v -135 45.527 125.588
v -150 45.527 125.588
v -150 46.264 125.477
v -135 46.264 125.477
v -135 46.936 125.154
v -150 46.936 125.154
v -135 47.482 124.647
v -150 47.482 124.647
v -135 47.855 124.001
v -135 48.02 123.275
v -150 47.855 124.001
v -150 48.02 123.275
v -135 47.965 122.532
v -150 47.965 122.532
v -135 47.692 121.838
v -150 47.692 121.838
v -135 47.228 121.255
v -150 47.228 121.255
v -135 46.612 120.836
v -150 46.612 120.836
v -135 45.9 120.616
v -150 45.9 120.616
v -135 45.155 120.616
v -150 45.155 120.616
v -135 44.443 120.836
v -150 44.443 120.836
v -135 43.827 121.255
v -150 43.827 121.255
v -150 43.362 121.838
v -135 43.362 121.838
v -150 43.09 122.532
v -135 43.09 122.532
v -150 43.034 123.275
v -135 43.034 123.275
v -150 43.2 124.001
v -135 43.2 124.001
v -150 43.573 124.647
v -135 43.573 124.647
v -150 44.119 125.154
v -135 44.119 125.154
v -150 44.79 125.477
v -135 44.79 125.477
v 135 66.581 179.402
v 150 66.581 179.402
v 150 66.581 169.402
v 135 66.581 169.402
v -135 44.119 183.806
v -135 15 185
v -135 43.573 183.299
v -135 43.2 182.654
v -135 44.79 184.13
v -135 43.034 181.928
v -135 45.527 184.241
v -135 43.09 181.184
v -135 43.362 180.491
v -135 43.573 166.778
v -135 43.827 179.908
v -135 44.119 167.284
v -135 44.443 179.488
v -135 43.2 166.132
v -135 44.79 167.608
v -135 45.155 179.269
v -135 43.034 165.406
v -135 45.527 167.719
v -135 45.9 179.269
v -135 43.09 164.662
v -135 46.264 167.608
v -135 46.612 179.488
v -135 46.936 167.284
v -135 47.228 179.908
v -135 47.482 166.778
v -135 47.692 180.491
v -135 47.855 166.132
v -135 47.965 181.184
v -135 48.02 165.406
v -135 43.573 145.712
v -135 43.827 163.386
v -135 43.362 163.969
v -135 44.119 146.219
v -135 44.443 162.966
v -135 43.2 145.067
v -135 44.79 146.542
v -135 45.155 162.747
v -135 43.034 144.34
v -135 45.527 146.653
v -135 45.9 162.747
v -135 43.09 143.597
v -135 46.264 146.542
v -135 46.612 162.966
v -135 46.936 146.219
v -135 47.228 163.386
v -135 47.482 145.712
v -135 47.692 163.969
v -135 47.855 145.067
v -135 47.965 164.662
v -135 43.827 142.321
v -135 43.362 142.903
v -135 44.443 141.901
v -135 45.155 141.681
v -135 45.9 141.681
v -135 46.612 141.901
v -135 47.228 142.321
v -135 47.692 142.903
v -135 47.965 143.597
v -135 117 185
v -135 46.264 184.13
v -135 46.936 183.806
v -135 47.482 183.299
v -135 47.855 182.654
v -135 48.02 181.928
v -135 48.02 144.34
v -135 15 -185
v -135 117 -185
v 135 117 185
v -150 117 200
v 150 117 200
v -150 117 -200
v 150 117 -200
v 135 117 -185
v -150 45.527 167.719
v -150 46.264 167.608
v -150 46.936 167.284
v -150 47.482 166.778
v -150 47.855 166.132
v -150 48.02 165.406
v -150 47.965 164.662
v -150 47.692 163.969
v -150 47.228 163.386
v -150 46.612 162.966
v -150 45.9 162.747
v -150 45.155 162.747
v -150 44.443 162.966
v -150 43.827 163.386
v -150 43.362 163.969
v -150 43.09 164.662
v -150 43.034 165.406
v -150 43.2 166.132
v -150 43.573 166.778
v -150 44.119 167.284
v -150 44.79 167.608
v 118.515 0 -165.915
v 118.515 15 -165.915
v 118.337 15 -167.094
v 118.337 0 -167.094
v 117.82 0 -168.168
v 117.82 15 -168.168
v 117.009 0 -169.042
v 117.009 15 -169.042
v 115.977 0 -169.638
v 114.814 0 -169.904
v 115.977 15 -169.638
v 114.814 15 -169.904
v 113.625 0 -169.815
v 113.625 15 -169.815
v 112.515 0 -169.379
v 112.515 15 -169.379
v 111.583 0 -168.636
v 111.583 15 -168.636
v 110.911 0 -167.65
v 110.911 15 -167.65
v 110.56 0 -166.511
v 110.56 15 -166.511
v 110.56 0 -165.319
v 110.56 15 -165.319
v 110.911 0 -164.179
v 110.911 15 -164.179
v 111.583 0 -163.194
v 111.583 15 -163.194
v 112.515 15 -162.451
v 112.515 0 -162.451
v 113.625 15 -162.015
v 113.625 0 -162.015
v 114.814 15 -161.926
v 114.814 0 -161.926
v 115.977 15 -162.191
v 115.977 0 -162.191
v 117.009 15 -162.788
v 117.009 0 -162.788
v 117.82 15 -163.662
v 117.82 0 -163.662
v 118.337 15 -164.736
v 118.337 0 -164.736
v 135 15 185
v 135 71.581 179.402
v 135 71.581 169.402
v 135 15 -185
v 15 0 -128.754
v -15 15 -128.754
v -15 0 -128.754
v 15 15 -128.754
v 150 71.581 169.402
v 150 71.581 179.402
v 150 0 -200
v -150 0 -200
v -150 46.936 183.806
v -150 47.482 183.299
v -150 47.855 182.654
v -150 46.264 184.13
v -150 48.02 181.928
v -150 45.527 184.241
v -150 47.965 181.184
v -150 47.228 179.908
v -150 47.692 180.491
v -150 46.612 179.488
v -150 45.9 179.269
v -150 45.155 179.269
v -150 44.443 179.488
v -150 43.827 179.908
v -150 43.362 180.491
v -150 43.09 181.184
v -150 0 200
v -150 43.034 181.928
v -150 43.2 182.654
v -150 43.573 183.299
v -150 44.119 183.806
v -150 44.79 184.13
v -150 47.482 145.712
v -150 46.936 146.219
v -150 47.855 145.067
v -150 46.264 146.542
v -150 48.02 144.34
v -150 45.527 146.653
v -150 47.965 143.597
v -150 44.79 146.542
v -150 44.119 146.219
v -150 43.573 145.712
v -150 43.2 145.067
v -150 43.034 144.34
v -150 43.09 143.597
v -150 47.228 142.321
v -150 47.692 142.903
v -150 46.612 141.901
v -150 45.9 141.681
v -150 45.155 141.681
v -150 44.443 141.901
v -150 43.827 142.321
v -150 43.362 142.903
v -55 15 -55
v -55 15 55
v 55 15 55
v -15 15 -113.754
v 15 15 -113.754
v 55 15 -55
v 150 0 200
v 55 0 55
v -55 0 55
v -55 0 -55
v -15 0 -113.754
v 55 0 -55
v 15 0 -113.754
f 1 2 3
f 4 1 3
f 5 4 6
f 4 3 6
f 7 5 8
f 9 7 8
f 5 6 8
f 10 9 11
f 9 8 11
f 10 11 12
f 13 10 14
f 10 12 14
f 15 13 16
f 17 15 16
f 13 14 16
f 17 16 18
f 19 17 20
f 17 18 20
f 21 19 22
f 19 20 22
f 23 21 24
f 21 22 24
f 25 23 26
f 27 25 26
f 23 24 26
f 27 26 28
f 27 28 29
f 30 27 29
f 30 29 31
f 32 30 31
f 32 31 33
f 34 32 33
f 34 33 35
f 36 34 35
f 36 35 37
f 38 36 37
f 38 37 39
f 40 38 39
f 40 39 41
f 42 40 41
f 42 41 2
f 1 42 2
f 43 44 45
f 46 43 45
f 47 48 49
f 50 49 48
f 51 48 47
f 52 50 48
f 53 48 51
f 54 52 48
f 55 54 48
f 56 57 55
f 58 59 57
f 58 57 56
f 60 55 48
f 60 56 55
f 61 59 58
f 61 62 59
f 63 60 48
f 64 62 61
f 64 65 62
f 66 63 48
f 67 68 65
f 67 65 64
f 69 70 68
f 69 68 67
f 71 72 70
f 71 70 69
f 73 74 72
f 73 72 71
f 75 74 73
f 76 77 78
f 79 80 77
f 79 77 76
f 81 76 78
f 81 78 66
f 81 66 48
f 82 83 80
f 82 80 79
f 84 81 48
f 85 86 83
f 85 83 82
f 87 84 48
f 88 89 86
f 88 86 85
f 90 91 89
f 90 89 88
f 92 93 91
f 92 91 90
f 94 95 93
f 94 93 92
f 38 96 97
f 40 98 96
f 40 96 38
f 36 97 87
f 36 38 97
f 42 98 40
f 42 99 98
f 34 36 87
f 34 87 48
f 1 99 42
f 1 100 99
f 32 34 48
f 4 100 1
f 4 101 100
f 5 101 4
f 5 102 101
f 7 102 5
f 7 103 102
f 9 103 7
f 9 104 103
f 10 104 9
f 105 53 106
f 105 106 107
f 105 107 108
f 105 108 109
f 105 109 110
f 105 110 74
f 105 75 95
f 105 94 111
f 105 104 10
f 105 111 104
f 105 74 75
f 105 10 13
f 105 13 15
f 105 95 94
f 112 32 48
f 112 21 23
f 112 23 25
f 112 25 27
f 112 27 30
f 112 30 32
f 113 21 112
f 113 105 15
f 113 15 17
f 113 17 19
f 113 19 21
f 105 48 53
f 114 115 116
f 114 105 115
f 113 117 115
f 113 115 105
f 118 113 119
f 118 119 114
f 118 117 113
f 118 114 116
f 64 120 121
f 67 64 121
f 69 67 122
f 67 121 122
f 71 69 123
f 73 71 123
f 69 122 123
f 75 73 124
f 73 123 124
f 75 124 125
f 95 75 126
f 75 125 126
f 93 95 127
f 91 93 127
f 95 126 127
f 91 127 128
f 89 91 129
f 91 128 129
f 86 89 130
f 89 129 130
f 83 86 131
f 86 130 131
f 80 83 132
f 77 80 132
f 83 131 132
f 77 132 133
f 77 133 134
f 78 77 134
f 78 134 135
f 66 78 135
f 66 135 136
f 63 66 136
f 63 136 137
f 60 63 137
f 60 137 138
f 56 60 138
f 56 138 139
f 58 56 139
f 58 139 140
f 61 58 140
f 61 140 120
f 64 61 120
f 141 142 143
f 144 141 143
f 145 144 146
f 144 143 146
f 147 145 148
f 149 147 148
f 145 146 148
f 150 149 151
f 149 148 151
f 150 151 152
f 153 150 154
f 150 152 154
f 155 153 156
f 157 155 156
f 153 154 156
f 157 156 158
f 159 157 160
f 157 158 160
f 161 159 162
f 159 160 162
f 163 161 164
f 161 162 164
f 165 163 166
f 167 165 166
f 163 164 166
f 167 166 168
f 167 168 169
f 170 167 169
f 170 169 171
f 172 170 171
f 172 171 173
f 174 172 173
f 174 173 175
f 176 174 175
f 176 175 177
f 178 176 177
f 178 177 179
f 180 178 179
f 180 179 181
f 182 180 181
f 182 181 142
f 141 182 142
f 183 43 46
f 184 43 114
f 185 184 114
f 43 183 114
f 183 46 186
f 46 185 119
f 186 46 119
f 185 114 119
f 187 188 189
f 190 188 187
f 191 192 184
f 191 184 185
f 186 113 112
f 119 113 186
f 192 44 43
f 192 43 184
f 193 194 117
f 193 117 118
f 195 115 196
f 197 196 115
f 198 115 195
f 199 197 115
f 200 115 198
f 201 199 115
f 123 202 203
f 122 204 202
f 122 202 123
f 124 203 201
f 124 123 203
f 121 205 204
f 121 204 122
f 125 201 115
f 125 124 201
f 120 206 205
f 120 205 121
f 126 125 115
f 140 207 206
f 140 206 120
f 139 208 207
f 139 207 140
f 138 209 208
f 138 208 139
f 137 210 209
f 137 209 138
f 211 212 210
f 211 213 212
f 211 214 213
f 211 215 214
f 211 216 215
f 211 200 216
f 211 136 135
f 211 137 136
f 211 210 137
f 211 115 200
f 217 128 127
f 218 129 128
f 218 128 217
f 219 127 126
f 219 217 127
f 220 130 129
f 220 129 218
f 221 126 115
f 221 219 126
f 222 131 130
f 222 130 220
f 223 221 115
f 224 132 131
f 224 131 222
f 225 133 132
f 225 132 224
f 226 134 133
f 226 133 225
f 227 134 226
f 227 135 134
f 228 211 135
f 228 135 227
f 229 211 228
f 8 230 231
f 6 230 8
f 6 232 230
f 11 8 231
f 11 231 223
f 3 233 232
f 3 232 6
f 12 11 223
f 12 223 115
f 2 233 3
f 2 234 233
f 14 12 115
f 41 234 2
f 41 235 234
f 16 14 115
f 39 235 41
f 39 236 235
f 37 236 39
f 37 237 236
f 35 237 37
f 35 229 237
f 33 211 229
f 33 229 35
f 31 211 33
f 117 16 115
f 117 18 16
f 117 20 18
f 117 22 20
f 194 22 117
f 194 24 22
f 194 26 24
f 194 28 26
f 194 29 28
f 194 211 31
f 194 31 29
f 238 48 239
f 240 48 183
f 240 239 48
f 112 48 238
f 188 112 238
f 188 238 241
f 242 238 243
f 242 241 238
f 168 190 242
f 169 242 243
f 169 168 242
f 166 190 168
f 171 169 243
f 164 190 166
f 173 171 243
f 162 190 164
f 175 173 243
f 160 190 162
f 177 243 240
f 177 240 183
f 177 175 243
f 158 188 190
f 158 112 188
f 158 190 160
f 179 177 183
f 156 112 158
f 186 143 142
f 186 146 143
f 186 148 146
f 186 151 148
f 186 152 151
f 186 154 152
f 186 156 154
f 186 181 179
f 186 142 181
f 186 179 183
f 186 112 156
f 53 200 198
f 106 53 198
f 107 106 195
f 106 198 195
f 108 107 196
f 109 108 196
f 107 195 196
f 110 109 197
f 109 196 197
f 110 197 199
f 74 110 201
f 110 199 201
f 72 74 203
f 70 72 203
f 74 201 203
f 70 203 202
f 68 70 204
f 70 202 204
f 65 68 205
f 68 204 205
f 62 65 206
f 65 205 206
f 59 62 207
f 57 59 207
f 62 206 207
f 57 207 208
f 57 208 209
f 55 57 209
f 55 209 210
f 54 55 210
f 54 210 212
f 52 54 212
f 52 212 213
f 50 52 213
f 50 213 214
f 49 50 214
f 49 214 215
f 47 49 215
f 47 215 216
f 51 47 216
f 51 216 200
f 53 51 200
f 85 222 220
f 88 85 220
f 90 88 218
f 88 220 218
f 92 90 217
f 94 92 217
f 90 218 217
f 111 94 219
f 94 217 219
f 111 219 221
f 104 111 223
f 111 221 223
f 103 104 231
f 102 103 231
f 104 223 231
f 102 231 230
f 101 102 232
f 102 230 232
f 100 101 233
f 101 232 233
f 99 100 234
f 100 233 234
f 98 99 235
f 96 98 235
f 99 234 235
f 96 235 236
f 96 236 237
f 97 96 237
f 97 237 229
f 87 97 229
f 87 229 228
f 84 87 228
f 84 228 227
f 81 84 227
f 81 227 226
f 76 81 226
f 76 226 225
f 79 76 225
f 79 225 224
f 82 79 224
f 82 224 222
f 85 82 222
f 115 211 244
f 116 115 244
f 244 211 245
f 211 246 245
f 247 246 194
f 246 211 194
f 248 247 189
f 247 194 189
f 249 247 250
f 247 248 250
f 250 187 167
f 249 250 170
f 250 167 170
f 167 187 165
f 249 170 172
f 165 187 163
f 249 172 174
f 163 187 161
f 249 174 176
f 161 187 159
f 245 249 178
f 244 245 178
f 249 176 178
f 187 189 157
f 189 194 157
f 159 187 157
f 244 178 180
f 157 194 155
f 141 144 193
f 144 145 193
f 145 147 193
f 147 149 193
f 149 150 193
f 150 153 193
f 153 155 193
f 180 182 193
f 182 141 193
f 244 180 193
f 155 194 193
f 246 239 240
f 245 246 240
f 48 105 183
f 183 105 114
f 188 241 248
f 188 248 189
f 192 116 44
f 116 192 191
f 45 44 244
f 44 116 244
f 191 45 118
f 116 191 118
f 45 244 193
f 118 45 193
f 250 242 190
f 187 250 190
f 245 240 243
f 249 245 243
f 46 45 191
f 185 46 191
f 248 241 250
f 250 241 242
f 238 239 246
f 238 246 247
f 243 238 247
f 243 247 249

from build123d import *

# Parameters (mm, degrees)
SKETCH1_W           = 300
SKETCH1_H           = 400
BOSS_EXTRUDE2_DEPTH = 117
SKETCH3_W           = 110
SKETCH3_H           = 110
CUT_EXTRUDE2_DEPTH  = 117
SKETCH5_W           = 270
SKETCH5_H           = 370
CUT_EXTRUDE3_DEPTH  = 102
SKETCH7_W           = 30
SKETCH7_H           = 15
CUT_EXTRUDE5_DEPTH  = 102
SKETCH8_W           = 10
SKETCH8_H           = 5
CUT_EXTRUDE7_DEPTH  = 90
SKETCH9_R           = 2.5
CUT_EXTRUDE8_DEPTH  = 90
SKETCH10_R          = 4
CUT_EXTRUDE9_DEPTH  = 90


with BuildPart() as part:
    # Sketch1 → Boss-Extrude2 (new body)
    with BuildSketch(Plane(origin=(0, 0, 0), x_dir=(1, 0, 0), z_dir=(0, 1, 0))):
        Rectangle(SKETCH1_W, SKETCH1_H)
    extrude(amount=BOSS_EXTRUDE2_DEPTH)

    # Sketch3 → Cut-Extrude2 (cut)
    with BuildSketch(Plane(origin=(0, 117, 0), x_dir=(1, 0, 0), z_dir=(0, 1, 0))):
        Rectangle(SKETCH3_W, SKETCH3_H)
    extrude(amount=-CUT_EXTRUDE2_DEPTH, mode=Mode.SUBTRACT)

    # Sketch5 → Cut-Extrude3 (cut)
    with BuildSketch(Plane(origin=(0, 117, 0), x_dir=(1, 0, 0), z_dir=(0, 1, 0))):
        Rectangle(SKETCH5_W, SKETCH5_H)
    extrude(amount=-CUT_EXTRUDE3_DEPTH, mode=Mode.SUBTRACT)

    # Sketch7 → Cut-Extrude5 (cut)
    with BuildSketch(Plane(origin=(0, 15, 0), x_dir=(1, 0, 0), z_dir=(0, 1, 0))):
        with Locations((0, 121.254101577)):
            Rectangle(SKETCH7_W, SKETCH7_H)
    extrude(amount=-CUT_EXTRUDE5_DEPTH, mode=Mode.SUBTRACT)

    # Sketch8 → Cut-Extrude7 (cut)
    with BuildSketch(Plane(origin=(150, 0, 0), x_dir=(0, 0, -1), z_dir=(1, 0, 0))):
        with Locations((-174.402323873, 69.081419449)):
            Rectangle(SKETCH8_W, SKETCH8_H)
    extrude(amount=-CUT_EXTRUDE7_DEPTH, mode=Mode.SUBTRACT)

    # Sketch9 → Cut-Extrude8 (cut)
    with BuildSketch(Plane.ZY.offset(150)):
        with Locations((181.740675273, 45.527316057)):
            Circle(SKETCH9_R)
        with Locations((165.218795702, 45.527316057)):
            Circle(SKETCH9_R)
        with Locations((144.15339925, 45.527316057)):
            Circle(SKETCH9_R)
        with Locations((123.088002798, 45.527316057)):
            Circle(SKETCH9_R)
    extrude(amount=-CUT_EXTRUDE8_DEPTH, mode=Mode.SUBTRACT)

    # Sketch10 → Cut-Extrude9 (cut)
    with BuildSketch(Plane(origin=(0, 15, 0), x_dir=(1, 0, 0), z_dir=(0, 1, 0))):
        with Locations((114.515150382, 165.914920232)):
            Circle(SKETCH10_R)
    extrude(amount=-CUT_EXTRUDE9_DEPTH, mode=Mode.SUBTRACT)


solid = part.part
